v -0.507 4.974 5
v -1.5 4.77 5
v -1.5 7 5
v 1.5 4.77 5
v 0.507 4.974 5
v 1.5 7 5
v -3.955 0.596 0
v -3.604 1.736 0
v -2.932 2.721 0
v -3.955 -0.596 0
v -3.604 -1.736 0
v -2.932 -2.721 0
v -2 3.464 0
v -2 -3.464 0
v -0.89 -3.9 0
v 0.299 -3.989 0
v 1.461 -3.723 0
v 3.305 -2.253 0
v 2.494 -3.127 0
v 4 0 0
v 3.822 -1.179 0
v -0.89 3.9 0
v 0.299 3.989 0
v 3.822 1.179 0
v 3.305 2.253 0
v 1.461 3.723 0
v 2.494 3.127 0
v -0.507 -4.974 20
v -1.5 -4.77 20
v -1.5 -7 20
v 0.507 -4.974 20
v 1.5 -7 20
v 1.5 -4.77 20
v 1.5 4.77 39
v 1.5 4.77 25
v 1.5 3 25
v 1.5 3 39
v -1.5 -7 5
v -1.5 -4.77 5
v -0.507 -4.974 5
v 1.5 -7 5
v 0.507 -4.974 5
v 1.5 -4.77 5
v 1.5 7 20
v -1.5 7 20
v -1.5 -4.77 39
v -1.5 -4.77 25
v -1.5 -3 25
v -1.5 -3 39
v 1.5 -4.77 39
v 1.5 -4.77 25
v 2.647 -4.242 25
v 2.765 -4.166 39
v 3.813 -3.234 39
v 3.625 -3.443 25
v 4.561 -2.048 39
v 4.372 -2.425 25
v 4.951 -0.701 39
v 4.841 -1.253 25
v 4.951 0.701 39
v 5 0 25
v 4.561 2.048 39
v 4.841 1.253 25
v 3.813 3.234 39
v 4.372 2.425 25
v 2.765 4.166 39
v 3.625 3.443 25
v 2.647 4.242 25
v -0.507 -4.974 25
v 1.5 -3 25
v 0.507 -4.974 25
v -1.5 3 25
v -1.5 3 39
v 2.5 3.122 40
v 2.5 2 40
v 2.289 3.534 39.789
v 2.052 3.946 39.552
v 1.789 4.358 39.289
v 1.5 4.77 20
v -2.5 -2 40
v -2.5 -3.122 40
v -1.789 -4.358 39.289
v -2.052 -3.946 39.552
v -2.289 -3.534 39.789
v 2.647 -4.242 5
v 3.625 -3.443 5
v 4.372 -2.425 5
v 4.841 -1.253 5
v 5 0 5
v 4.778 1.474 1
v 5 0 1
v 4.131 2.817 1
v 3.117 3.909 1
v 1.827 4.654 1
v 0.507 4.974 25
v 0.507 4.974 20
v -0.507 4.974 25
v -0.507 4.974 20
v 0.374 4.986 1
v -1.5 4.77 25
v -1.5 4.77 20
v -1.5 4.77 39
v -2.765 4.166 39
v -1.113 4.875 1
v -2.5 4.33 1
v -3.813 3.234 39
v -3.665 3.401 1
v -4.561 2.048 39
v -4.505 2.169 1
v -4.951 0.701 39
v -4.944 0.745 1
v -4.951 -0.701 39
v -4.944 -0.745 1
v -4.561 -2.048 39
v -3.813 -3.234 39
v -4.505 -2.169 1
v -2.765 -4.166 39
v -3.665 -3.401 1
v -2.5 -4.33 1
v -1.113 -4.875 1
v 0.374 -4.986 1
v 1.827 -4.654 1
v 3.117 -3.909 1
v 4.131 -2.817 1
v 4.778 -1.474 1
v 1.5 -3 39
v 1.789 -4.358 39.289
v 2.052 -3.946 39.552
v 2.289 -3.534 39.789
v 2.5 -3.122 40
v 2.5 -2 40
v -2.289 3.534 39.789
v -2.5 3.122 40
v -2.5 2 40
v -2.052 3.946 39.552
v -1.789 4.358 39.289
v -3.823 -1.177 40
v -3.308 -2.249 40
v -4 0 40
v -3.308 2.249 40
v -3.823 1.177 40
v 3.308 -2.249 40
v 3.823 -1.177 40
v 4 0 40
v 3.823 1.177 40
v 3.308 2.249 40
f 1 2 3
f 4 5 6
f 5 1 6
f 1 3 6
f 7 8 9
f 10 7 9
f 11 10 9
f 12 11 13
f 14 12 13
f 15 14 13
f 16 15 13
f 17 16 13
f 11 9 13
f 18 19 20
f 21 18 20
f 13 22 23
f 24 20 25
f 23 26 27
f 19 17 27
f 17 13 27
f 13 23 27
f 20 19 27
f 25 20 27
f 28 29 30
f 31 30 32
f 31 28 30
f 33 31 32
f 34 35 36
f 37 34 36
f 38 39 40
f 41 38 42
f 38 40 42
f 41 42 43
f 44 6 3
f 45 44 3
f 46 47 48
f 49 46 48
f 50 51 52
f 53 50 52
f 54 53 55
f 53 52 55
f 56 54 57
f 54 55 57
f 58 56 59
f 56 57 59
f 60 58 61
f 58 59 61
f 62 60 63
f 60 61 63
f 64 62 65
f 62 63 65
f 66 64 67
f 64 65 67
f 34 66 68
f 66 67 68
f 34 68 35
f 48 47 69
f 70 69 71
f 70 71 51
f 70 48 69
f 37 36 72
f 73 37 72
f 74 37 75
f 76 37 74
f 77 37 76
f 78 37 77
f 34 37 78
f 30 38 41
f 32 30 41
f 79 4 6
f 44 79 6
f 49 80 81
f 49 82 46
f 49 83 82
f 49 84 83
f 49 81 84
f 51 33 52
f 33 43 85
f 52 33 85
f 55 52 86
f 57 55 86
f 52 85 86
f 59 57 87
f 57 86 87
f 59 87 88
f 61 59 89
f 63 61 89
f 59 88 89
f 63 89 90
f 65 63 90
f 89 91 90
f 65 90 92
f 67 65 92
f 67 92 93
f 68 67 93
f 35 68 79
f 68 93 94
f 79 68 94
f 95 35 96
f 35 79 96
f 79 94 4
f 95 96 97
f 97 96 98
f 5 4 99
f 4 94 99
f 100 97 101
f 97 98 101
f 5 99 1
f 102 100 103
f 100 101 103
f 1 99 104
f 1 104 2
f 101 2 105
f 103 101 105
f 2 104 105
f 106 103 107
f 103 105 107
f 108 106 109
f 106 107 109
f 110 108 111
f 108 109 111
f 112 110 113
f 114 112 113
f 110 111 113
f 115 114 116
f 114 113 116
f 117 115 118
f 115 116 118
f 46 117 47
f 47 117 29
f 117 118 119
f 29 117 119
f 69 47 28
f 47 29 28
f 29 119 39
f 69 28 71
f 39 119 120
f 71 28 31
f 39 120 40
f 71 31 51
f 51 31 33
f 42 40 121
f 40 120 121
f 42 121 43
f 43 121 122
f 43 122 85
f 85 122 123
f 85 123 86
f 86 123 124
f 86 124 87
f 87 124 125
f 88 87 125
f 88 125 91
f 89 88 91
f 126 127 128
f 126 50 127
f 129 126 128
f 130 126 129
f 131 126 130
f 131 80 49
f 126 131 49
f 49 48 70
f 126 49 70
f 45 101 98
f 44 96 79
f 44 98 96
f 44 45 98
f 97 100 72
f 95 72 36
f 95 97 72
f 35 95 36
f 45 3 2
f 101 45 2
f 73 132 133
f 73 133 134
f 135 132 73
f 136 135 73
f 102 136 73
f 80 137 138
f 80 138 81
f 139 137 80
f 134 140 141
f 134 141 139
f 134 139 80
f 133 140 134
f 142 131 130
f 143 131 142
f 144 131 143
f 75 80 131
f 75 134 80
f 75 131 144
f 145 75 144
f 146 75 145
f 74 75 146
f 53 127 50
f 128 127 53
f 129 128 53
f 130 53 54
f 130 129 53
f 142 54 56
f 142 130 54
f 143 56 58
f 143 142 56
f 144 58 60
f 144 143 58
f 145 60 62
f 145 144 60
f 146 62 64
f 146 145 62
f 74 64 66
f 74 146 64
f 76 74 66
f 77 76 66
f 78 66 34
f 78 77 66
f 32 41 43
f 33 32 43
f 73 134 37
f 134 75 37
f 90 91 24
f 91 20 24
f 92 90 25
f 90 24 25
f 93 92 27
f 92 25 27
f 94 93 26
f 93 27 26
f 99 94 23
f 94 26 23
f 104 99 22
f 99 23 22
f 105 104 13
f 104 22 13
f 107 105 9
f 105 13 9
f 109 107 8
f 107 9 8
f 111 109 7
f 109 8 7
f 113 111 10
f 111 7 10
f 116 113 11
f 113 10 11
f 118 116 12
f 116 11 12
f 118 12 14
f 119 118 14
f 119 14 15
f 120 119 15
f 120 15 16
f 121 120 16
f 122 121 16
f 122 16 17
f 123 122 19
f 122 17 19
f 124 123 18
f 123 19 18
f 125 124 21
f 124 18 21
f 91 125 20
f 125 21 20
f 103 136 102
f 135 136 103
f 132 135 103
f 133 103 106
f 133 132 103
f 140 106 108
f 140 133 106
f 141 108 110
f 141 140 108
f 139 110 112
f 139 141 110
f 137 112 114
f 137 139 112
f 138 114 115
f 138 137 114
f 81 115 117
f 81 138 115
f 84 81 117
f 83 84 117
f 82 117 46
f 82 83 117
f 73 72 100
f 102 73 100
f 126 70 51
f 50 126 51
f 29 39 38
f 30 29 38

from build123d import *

# Parameters (mm, degrees)
F0_R         = 5
F1_DEPTH     = 5
F3_DEPTH     = 15
F5_DEPTH     = 5
F7_DEPTH     = 15
F8_T1_DEPTH  = 4.3413789951
F8_T3_DEPTH  = 3
F8_T5_DEPTH  = 4.3413789951
F8_T10_ANGLE = 204.0849815342
F8_T12_ANGLE = 204.0849815342
F8_T17_DEPTH = 6.913061983
F8_T21_DEPTH = 5.571682988
F8_T28_DEPTH = 6.913061983
F8_T32_DEPTH = 5.571682988
F8_T39_DEPTH = 6.913061983
F8_T43_DEPTH = 5.571682988
F8_T50_DEPTH = 5.571682988
F8_T54_DEPTH = 6.913061983


# Not quite as in the source:
# - a fillet or chamfer that OpenCascade refuses, or shapes differently, is made with other operations: its cross-section is extruded or revolved along the edge and cut away or added


with BuildPart() as f1:
    # F0 (on Top) → F1 (new body)
    with BuildSketch(Plane.XY):
        Circle(F0_R)
    extrude(amount=F1_DEPTH)

    # F2 (on face) → F3 (join)
    with BuildSketch(Plane.XY.offset(5)):
        with BuildLine():
            Line((-1.5, 7), (-1.5, 4.7696960071))
            ThreePointArc((-1.5, 4.7696960071), (-5, 0), (-1.5, -4.7696960071))
            Line((-1.5, -4.7696960071), (-1.5, -7))
            Line((-1.5, -7), (1.5, -7))
            Line((1.5, -7), (1.5, -4.7696960071))
            ThreePointArc((1.5, -4.7696960071), (5, 0), (1.5, 4.7696960071))
            Line((1.5, 4.7696960071), (1.5, 7))
            Line((1.5, 7), (-1.5, 7))
        make_face()
    extrude(amount=F3_DEPTH)

    # F4 (on face) → F5 (join)
    with BuildSketch(Plane.XY.offset(20)):
        with BuildLine():
            ThreePointArc((1.5, -4.7696960071), (4.0311288741, -2.9580398915), (5, 0))
            ThreePointArc((5, 0), (4.0311288741, 2.9580398915), (1.5, 4.7696960071))
            ThreePointArc((1.5, 4.7696960071), (0, 5), (-1.5, 4.7696960071))
            ThreePointArc((-1.5, 4.7696960071), (-5, 0), (-1.5, -4.7696960071))
            ThreePointArc((-1.5, -4.7696960071), (0, -5), (1.5, -4.7696960071))
        make_face()
    extrude(amount=F5_DEPTH)

    # F6 (on face) → F7 (join)
    with BuildSketch(Plane.XY.offset(25)):
        with BuildLine():
            Line((1.5, -3), (1.5, -4.7696960071))
            ThreePointArc((1.5, -4.7696960071), (5, 0), (1.5, 4.7696960071))
            Line((1.5, 4.7696960071), (1.5, 3))
            Line((1.5, 3), (-1.5, 3))
            Line((-1.5, 3), (-1.5, 4.7696960071))
            ThreePointArc((-1.5, 4.7696960071), (-5, 0), (-1.5, -4.7696960071))
            Line((-1.5, -4.7696960071), (-1.5, -3))
            Line((-1.5, -3), (1.5, -3))
        make_face()
    extrude(amount=F7_DEPTH)

    # F8: chamfer of 1 on 9 edges, made by hand

    # F8_s2 → F8_t1 (cut)
    with BuildSketch(Plane.XZ.offset(3)):
        Polygon((-2.5, 40), (-1.5, 39), (-1.5, 40), align=None)
        Polygon((1.5, 39), (2.5, 40), (1.5, 40), align=None)
    extrude(amount=F8_T1_DEPTH, mode=Mode.SUBTRACT)

    # F8_s4 → F8_t3 (cut)
    with BuildSketch(Plane.YZ.offset(-1.5)):
        Polygon((-2, 40), (-3, 39), (-3, 40), align=None)
        Polygon((2, 40), (3, 39), (3, 40), align=None)
    extrude(amount=F8_T3_DEPTH, mode=Mode.SUBTRACT)

    # F8_s6 → F8_t5 (cut)
    with BuildSketch(Plane.XZ.offset(-7.3413789951)):
        Polygon((1.5, 39), (2.5, 40), (1.5, 40), align=None)
        Polygon((-2.5, 40), (-1.5, 39), (-1.5, 40), align=None)
    extrude(amount=F8_T5_DEPTH, mode=Mode.SUBTRACT)

    # F8_s7 → F8_t8 (revolve, cut)
    with BuildSketch(Plane.XZ):
        Polygon((5, 1), (4, 0), (5, 0), align=None)
    revolve(axis=Axis((0, 0, 0), (0, 0, 1)), mode=Mode.SUBTRACT)

    # F8_s9 → F8_t10 (revolve, cut)
    with BuildSketch(Plane(origin=(0, 0, 0), x_dir=(0, 0, 1), z_dir=(-0.9779931437, 0.2086370315, 0))):
        Polygon((39, -5), (40, -4), (40, -5), align=None)
    revolve(axis=Axis((0, 0, 40), (0, 0, 1)), revolution_arc=F8_T10_ANGLE, mode=Mode.SUBTRACT)

    # F8_s11 → F8_t12 (revolve, cut)
    with BuildSketch(Plane(origin=(0, 0, 0), x_dir=(0, 0, 1), z_dir=(0.9779931437, -0.2086370315, 0))):
        Polygon((39, -5), (40, -4), (40, -5), align=None)
    revolve(axis=Axis((0, 0, 40), (0, 0, 1)), revolution_arc=F8_T12_ANGLE, mode=Mode.SUBTRACT)


with BuildPart() as f8_tool15:
    # F8_s16 → F8_t17 (new body)
    with BuildSketch(Plane.XZ.offset(7.3413789951)):
        Polygon((-2.5, 40), (-1.5, 39), (-1.5, 40), align=None)
    extrude(amount=-F8_T17_DEPTH)

    split(bisect_by=Plane.XZ.offset(3), keep=Keep.BOTTOM)


with BuildPart() as f8_tool19:
    # F8_s20 → F8_t21 (new body)
    with BuildSketch(Plane.YZ.offset(-4.071682988)):
        Polygon((-2, 40), (-3, 39), (-3, 40), align=None)
    extrude(amount=F8_T21_DEPTH)

    split(bisect_by=Plane.YZ.offset(-1.5), keep=Keep.BOTTOM)


with BuildPart() as f8_tool15_1:
    add(f8_tool15.part)

    # F8_t23: intersect F8_tool19
    add(f8_tool19.part, mode=Mode.INTERSECT)


with BuildPart() as f1_1:
    add(f1.part)

    # F8_t13: cut F8_tool15
    add(f8_tool15_1.part, mode=Mode.SUBTRACT)


with BuildPart() as f8_tool26:
    # F8_s27 → F8_t28 (new body)
    with BuildSketch(Plane.XZ.offset(0.428317012)):
        Polygon((1.5, 39), (2.5, 40), (1.5, 40), align=None)
    extrude(amount=F8_T28_DEPTH)

    split(bisect_by=Plane.XZ.offset(3), keep=Keep.BOTTOM)


with BuildPart() as f8_tool30:
    # F8_s31 → F8_t32 (new body)
    with BuildSketch(Plane.YZ.offset(-1.5)):
        Polygon((-2, 40), (-3, 39), (-3, 40), align=None)
    extrude(amount=F8_T32_DEPTH)

    split(bisect_by=Plane.YZ.offset(1.5), keep=Keep.TOP)


with BuildPart() as f8_tool26_1:
    add(f8_tool26.part)

    # F8_t34: intersect F8_tool30
    add(f8_tool30.part, mode=Mode.INTERSECT)


with BuildPart() as f1_2:
    add(f1_1.part)

    # F8_t24: cut F8_tool26
    add(f8_tool26_1.part, mode=Mode.SUBTRACT)


with BuildPart() as f8_tool37:
    # F8_s38 → F8_t39 (new body)
    with BuildSketch(Plane.XZ.offset(-7.3413789951)):
        Polygon((1.5, 39), (2.5, 40), (1.5, 40), align=None)
    extrude(amount=F8_T39_DEPTH)

    split(bisect_by=Plane.XZ.offset(-3), keep=Keep.TOP)


with BuildPart() as f8_tool41:
    # F8_s42 → F8_t43 (new body)
    with BuildSketch(Plane.YZ.offset(4.071682988)):
        Polygon((2, 40), (3, 39), (3, 40), align=None)
    extrude(amount=-F8_T43_DEPTH)

    split(bisect_by=Plane.YZ.offset(1.5), keep=Keep.TOP)


with BuildPart() as f8_tool37_1:
    add(f8_tool37.part)

    # F8_t45: intersect F8_tool41
    add(f8_tool41.part, mode=Mode.INTERSECT)


with BuildPart() as f1_3:
    add(f1_2.part)

    # F8_t35: cut F8_tool37
    add(f8_tool37_1.part, mode=Mode.SUBTRACT)


with BuildPart() as f8_tool48:
    # F8_s49 → F8_t50 (new body)
    with BuildSketch(Plane.YZ.offset(1.5)):
        Polygon((2, 40), (3, 39), (3, 40), align=None)
    extrude(amount=-F8_T50_DEPTH)

    split(bisect_by=Plane.YZ.offset(-1.5), keep=Keep.BOTTOM)


with BuildPart() as f8_tool52:
    # F8_s53 → F8_t54 (new body)
    with BuildSketch(Plane.XZ.offset(-0.428317012)):
        Polygon((-2.5, 40), (-1.5, 39), (-1.5, 40), align=None)
    extrude(amount=-F8_T54_DEPTH)

    split(bisect_by=Plane.XZ.offset(-3), keep=Keep.TOP)


with BuildPart() as f8_tool48_1:
    add(f8_tool48.part)

    # F8_t56: intersect F8_tool52
    add(f8_tool52.part, mode=Mode.INTERSECT)


with BuildPart() as f1_4:
    add(f1_3.part)

    # F8_t46: cut F8_tool48
    add(f8_tool48_1.part, mode=Mode.SUBTRACT)


solid = f1_4.part
